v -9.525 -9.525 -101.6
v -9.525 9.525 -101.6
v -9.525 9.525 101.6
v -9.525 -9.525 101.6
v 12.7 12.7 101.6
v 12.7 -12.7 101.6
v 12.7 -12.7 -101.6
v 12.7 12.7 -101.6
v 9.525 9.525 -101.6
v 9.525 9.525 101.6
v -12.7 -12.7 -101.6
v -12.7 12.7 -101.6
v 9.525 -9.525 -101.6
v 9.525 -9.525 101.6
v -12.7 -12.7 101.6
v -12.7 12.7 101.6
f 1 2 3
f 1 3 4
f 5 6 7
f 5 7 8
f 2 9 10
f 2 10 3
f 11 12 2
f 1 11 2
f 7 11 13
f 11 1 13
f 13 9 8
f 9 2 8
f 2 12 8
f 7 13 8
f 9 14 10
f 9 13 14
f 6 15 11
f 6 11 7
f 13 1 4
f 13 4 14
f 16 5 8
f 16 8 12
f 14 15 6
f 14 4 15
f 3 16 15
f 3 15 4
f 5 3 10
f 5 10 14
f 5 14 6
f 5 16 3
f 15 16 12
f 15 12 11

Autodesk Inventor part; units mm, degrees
ref_plane "YZ Plane" through (0, 0, 0) normal (1, 0, 0) x (0, 1, 0)
ref_plane "XZ Plane" through (0, 0, 0) normal (0, 1, 0) x (-1, 0, 0)
ref_plane "XY Plane" through (0, 0, 0) normal (0, 0, 1) x (1, 0, 0)
sketch "Sketch1" plane through (0, 0, 0) normal (0, 0, 1) x (1, 0, 0)
  line L0 (-12.7, -12.7) -> (12.7, -12.7)
  line L1 (12.7, -12.7) -> (12.7, 12.7)
  line L2 (12.7, 12.7) -> (-12.7, 12.7)
  line L3 (-12.7, 12.7) -> (-12.7, -12.7)
  line L4 (-12.7, -12.7) -> (12.7, 12.7) construction
  line L5 (12.7, -12.7) -> (-12.7, 12.7) construction
  line L6 (-9.525, -9.525) -> (9.525, -9.525)
  line L7 (9.525, -9.525) -> (9.525, 9.525)
  line L8 (9.525, 9.525) -> (-9.525, 9.525)
  line L9 (-9.525, 9.525) -> (-9.525, -9.525)
  line L10 (-9.525, -9.525) -> (9.525, 9.525) construction
  line L11 (9.525, -9.525) -> (-9.525, 9.525) construction
  point P0 (0, 0)
  dimension "d0" = 25.4
  dimension "d1" = 25.4
  dimension "d2" = 3.175
  dimension "d3" = 3.175
extrude "Extrusion1" add sketch "Sketch1" along normal mid plane 203.2
properties part number "8-inchAluminumTubing"
